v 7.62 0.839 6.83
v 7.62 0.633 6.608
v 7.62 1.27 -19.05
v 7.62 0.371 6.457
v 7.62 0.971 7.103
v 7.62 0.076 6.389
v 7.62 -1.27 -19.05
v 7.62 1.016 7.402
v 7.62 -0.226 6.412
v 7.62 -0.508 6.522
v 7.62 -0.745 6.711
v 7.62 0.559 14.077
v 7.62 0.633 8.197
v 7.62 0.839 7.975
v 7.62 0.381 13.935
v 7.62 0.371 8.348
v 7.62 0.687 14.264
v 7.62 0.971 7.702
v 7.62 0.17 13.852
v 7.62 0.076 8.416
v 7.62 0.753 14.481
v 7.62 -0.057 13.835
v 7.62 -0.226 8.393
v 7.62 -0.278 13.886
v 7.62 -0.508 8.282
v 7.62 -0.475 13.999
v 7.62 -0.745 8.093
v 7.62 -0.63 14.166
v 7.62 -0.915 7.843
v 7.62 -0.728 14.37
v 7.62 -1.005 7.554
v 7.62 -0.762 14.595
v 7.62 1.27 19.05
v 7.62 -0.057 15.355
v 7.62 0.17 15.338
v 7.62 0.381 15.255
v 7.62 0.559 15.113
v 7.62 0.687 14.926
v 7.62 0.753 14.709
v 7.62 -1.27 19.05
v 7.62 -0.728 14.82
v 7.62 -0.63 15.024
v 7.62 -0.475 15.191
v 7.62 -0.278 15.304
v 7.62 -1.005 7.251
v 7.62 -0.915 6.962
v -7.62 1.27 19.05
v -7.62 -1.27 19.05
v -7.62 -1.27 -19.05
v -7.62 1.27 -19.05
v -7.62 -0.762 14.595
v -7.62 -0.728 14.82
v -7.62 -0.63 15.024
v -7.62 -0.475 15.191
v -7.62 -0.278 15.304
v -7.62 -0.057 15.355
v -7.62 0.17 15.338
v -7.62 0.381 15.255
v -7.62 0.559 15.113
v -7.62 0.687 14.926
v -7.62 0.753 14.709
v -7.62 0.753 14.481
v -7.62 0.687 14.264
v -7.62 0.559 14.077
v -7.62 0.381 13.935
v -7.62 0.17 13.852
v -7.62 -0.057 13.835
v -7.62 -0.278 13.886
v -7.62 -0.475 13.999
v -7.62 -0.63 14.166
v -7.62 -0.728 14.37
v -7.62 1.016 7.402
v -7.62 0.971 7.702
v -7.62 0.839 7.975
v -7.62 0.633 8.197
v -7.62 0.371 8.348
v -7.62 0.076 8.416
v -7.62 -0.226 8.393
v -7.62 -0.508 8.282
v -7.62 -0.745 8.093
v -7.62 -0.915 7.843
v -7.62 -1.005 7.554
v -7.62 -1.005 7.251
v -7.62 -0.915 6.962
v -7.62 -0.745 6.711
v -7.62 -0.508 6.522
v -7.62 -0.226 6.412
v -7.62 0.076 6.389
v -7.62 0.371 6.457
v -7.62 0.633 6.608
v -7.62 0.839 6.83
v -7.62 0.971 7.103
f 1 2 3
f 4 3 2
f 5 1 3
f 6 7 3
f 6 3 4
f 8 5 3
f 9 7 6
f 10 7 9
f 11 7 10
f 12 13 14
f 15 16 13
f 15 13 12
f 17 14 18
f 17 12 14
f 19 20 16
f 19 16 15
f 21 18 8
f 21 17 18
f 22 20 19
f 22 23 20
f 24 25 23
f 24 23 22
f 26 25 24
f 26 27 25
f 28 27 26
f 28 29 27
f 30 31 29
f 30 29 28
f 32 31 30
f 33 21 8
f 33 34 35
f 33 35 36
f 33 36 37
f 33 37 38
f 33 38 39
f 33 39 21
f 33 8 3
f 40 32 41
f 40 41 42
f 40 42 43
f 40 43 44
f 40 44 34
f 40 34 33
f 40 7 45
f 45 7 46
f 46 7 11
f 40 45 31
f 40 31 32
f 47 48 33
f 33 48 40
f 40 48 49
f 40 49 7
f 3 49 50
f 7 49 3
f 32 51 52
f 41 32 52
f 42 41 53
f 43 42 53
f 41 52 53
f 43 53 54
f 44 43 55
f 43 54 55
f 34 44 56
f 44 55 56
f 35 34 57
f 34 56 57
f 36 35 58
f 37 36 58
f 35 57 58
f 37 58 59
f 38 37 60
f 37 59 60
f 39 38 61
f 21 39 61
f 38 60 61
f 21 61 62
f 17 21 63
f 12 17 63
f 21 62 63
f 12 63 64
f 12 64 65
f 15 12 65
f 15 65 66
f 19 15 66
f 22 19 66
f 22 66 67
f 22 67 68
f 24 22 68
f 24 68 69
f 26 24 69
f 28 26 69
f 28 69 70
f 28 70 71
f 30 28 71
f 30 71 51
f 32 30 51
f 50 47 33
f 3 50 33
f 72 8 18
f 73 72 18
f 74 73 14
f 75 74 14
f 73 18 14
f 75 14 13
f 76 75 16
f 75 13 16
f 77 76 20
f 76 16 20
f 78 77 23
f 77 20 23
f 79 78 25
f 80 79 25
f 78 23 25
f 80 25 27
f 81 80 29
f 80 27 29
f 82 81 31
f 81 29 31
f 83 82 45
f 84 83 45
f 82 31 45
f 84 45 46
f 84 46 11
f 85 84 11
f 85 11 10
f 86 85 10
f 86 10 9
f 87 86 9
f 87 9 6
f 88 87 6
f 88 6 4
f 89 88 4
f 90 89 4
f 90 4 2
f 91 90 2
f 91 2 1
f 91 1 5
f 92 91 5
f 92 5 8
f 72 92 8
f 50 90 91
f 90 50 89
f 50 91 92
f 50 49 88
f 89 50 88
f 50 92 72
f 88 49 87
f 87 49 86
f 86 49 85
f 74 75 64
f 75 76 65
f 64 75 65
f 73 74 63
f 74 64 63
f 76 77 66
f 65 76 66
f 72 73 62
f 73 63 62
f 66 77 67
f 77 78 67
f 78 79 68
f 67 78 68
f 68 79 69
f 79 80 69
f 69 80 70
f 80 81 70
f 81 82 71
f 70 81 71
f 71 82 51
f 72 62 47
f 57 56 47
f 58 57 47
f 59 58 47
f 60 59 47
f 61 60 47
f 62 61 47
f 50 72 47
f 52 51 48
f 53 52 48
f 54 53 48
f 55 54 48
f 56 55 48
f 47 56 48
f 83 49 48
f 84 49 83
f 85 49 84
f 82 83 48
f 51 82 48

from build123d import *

# Parameters (mm, degrees)
F0_W     = 15.24
F0_H     = 38.1
F1_DEPTH = 1.27
F5_D     = 1.524
F6_R     = 1.016
F7_DEPTH = 15.241


# Not quite as in the source:
# - the program builds the solid bodies; features that only make, move or delete a surface that nothing else refers to are left out


with BuildPart() as f1:
    # F0 (on Front) → F1 (new body, symmetric)
    with BuildSketch(Plane.XZ):
        Rectangle(F0_W, F0_H)
    extrude(amount=F1_DEPTH, both=True)

    # F5 (through all)
    with Locations(Plane.YZ.offset(7.62)):
        with Locations((0, 14.5949712023)):
            Hole(F5_D / 2)

    # F6 (on face) → F7 (cut, through all)
    with BuildSketch(Plane.YZ.offset(7.62)):
        with Locations((0, 7.4023683179)):
            Circle(F6_R)
    extrude(amount=-F7_DEPTH, mode=Mode.SUBTRACT)


solid = f1.part
